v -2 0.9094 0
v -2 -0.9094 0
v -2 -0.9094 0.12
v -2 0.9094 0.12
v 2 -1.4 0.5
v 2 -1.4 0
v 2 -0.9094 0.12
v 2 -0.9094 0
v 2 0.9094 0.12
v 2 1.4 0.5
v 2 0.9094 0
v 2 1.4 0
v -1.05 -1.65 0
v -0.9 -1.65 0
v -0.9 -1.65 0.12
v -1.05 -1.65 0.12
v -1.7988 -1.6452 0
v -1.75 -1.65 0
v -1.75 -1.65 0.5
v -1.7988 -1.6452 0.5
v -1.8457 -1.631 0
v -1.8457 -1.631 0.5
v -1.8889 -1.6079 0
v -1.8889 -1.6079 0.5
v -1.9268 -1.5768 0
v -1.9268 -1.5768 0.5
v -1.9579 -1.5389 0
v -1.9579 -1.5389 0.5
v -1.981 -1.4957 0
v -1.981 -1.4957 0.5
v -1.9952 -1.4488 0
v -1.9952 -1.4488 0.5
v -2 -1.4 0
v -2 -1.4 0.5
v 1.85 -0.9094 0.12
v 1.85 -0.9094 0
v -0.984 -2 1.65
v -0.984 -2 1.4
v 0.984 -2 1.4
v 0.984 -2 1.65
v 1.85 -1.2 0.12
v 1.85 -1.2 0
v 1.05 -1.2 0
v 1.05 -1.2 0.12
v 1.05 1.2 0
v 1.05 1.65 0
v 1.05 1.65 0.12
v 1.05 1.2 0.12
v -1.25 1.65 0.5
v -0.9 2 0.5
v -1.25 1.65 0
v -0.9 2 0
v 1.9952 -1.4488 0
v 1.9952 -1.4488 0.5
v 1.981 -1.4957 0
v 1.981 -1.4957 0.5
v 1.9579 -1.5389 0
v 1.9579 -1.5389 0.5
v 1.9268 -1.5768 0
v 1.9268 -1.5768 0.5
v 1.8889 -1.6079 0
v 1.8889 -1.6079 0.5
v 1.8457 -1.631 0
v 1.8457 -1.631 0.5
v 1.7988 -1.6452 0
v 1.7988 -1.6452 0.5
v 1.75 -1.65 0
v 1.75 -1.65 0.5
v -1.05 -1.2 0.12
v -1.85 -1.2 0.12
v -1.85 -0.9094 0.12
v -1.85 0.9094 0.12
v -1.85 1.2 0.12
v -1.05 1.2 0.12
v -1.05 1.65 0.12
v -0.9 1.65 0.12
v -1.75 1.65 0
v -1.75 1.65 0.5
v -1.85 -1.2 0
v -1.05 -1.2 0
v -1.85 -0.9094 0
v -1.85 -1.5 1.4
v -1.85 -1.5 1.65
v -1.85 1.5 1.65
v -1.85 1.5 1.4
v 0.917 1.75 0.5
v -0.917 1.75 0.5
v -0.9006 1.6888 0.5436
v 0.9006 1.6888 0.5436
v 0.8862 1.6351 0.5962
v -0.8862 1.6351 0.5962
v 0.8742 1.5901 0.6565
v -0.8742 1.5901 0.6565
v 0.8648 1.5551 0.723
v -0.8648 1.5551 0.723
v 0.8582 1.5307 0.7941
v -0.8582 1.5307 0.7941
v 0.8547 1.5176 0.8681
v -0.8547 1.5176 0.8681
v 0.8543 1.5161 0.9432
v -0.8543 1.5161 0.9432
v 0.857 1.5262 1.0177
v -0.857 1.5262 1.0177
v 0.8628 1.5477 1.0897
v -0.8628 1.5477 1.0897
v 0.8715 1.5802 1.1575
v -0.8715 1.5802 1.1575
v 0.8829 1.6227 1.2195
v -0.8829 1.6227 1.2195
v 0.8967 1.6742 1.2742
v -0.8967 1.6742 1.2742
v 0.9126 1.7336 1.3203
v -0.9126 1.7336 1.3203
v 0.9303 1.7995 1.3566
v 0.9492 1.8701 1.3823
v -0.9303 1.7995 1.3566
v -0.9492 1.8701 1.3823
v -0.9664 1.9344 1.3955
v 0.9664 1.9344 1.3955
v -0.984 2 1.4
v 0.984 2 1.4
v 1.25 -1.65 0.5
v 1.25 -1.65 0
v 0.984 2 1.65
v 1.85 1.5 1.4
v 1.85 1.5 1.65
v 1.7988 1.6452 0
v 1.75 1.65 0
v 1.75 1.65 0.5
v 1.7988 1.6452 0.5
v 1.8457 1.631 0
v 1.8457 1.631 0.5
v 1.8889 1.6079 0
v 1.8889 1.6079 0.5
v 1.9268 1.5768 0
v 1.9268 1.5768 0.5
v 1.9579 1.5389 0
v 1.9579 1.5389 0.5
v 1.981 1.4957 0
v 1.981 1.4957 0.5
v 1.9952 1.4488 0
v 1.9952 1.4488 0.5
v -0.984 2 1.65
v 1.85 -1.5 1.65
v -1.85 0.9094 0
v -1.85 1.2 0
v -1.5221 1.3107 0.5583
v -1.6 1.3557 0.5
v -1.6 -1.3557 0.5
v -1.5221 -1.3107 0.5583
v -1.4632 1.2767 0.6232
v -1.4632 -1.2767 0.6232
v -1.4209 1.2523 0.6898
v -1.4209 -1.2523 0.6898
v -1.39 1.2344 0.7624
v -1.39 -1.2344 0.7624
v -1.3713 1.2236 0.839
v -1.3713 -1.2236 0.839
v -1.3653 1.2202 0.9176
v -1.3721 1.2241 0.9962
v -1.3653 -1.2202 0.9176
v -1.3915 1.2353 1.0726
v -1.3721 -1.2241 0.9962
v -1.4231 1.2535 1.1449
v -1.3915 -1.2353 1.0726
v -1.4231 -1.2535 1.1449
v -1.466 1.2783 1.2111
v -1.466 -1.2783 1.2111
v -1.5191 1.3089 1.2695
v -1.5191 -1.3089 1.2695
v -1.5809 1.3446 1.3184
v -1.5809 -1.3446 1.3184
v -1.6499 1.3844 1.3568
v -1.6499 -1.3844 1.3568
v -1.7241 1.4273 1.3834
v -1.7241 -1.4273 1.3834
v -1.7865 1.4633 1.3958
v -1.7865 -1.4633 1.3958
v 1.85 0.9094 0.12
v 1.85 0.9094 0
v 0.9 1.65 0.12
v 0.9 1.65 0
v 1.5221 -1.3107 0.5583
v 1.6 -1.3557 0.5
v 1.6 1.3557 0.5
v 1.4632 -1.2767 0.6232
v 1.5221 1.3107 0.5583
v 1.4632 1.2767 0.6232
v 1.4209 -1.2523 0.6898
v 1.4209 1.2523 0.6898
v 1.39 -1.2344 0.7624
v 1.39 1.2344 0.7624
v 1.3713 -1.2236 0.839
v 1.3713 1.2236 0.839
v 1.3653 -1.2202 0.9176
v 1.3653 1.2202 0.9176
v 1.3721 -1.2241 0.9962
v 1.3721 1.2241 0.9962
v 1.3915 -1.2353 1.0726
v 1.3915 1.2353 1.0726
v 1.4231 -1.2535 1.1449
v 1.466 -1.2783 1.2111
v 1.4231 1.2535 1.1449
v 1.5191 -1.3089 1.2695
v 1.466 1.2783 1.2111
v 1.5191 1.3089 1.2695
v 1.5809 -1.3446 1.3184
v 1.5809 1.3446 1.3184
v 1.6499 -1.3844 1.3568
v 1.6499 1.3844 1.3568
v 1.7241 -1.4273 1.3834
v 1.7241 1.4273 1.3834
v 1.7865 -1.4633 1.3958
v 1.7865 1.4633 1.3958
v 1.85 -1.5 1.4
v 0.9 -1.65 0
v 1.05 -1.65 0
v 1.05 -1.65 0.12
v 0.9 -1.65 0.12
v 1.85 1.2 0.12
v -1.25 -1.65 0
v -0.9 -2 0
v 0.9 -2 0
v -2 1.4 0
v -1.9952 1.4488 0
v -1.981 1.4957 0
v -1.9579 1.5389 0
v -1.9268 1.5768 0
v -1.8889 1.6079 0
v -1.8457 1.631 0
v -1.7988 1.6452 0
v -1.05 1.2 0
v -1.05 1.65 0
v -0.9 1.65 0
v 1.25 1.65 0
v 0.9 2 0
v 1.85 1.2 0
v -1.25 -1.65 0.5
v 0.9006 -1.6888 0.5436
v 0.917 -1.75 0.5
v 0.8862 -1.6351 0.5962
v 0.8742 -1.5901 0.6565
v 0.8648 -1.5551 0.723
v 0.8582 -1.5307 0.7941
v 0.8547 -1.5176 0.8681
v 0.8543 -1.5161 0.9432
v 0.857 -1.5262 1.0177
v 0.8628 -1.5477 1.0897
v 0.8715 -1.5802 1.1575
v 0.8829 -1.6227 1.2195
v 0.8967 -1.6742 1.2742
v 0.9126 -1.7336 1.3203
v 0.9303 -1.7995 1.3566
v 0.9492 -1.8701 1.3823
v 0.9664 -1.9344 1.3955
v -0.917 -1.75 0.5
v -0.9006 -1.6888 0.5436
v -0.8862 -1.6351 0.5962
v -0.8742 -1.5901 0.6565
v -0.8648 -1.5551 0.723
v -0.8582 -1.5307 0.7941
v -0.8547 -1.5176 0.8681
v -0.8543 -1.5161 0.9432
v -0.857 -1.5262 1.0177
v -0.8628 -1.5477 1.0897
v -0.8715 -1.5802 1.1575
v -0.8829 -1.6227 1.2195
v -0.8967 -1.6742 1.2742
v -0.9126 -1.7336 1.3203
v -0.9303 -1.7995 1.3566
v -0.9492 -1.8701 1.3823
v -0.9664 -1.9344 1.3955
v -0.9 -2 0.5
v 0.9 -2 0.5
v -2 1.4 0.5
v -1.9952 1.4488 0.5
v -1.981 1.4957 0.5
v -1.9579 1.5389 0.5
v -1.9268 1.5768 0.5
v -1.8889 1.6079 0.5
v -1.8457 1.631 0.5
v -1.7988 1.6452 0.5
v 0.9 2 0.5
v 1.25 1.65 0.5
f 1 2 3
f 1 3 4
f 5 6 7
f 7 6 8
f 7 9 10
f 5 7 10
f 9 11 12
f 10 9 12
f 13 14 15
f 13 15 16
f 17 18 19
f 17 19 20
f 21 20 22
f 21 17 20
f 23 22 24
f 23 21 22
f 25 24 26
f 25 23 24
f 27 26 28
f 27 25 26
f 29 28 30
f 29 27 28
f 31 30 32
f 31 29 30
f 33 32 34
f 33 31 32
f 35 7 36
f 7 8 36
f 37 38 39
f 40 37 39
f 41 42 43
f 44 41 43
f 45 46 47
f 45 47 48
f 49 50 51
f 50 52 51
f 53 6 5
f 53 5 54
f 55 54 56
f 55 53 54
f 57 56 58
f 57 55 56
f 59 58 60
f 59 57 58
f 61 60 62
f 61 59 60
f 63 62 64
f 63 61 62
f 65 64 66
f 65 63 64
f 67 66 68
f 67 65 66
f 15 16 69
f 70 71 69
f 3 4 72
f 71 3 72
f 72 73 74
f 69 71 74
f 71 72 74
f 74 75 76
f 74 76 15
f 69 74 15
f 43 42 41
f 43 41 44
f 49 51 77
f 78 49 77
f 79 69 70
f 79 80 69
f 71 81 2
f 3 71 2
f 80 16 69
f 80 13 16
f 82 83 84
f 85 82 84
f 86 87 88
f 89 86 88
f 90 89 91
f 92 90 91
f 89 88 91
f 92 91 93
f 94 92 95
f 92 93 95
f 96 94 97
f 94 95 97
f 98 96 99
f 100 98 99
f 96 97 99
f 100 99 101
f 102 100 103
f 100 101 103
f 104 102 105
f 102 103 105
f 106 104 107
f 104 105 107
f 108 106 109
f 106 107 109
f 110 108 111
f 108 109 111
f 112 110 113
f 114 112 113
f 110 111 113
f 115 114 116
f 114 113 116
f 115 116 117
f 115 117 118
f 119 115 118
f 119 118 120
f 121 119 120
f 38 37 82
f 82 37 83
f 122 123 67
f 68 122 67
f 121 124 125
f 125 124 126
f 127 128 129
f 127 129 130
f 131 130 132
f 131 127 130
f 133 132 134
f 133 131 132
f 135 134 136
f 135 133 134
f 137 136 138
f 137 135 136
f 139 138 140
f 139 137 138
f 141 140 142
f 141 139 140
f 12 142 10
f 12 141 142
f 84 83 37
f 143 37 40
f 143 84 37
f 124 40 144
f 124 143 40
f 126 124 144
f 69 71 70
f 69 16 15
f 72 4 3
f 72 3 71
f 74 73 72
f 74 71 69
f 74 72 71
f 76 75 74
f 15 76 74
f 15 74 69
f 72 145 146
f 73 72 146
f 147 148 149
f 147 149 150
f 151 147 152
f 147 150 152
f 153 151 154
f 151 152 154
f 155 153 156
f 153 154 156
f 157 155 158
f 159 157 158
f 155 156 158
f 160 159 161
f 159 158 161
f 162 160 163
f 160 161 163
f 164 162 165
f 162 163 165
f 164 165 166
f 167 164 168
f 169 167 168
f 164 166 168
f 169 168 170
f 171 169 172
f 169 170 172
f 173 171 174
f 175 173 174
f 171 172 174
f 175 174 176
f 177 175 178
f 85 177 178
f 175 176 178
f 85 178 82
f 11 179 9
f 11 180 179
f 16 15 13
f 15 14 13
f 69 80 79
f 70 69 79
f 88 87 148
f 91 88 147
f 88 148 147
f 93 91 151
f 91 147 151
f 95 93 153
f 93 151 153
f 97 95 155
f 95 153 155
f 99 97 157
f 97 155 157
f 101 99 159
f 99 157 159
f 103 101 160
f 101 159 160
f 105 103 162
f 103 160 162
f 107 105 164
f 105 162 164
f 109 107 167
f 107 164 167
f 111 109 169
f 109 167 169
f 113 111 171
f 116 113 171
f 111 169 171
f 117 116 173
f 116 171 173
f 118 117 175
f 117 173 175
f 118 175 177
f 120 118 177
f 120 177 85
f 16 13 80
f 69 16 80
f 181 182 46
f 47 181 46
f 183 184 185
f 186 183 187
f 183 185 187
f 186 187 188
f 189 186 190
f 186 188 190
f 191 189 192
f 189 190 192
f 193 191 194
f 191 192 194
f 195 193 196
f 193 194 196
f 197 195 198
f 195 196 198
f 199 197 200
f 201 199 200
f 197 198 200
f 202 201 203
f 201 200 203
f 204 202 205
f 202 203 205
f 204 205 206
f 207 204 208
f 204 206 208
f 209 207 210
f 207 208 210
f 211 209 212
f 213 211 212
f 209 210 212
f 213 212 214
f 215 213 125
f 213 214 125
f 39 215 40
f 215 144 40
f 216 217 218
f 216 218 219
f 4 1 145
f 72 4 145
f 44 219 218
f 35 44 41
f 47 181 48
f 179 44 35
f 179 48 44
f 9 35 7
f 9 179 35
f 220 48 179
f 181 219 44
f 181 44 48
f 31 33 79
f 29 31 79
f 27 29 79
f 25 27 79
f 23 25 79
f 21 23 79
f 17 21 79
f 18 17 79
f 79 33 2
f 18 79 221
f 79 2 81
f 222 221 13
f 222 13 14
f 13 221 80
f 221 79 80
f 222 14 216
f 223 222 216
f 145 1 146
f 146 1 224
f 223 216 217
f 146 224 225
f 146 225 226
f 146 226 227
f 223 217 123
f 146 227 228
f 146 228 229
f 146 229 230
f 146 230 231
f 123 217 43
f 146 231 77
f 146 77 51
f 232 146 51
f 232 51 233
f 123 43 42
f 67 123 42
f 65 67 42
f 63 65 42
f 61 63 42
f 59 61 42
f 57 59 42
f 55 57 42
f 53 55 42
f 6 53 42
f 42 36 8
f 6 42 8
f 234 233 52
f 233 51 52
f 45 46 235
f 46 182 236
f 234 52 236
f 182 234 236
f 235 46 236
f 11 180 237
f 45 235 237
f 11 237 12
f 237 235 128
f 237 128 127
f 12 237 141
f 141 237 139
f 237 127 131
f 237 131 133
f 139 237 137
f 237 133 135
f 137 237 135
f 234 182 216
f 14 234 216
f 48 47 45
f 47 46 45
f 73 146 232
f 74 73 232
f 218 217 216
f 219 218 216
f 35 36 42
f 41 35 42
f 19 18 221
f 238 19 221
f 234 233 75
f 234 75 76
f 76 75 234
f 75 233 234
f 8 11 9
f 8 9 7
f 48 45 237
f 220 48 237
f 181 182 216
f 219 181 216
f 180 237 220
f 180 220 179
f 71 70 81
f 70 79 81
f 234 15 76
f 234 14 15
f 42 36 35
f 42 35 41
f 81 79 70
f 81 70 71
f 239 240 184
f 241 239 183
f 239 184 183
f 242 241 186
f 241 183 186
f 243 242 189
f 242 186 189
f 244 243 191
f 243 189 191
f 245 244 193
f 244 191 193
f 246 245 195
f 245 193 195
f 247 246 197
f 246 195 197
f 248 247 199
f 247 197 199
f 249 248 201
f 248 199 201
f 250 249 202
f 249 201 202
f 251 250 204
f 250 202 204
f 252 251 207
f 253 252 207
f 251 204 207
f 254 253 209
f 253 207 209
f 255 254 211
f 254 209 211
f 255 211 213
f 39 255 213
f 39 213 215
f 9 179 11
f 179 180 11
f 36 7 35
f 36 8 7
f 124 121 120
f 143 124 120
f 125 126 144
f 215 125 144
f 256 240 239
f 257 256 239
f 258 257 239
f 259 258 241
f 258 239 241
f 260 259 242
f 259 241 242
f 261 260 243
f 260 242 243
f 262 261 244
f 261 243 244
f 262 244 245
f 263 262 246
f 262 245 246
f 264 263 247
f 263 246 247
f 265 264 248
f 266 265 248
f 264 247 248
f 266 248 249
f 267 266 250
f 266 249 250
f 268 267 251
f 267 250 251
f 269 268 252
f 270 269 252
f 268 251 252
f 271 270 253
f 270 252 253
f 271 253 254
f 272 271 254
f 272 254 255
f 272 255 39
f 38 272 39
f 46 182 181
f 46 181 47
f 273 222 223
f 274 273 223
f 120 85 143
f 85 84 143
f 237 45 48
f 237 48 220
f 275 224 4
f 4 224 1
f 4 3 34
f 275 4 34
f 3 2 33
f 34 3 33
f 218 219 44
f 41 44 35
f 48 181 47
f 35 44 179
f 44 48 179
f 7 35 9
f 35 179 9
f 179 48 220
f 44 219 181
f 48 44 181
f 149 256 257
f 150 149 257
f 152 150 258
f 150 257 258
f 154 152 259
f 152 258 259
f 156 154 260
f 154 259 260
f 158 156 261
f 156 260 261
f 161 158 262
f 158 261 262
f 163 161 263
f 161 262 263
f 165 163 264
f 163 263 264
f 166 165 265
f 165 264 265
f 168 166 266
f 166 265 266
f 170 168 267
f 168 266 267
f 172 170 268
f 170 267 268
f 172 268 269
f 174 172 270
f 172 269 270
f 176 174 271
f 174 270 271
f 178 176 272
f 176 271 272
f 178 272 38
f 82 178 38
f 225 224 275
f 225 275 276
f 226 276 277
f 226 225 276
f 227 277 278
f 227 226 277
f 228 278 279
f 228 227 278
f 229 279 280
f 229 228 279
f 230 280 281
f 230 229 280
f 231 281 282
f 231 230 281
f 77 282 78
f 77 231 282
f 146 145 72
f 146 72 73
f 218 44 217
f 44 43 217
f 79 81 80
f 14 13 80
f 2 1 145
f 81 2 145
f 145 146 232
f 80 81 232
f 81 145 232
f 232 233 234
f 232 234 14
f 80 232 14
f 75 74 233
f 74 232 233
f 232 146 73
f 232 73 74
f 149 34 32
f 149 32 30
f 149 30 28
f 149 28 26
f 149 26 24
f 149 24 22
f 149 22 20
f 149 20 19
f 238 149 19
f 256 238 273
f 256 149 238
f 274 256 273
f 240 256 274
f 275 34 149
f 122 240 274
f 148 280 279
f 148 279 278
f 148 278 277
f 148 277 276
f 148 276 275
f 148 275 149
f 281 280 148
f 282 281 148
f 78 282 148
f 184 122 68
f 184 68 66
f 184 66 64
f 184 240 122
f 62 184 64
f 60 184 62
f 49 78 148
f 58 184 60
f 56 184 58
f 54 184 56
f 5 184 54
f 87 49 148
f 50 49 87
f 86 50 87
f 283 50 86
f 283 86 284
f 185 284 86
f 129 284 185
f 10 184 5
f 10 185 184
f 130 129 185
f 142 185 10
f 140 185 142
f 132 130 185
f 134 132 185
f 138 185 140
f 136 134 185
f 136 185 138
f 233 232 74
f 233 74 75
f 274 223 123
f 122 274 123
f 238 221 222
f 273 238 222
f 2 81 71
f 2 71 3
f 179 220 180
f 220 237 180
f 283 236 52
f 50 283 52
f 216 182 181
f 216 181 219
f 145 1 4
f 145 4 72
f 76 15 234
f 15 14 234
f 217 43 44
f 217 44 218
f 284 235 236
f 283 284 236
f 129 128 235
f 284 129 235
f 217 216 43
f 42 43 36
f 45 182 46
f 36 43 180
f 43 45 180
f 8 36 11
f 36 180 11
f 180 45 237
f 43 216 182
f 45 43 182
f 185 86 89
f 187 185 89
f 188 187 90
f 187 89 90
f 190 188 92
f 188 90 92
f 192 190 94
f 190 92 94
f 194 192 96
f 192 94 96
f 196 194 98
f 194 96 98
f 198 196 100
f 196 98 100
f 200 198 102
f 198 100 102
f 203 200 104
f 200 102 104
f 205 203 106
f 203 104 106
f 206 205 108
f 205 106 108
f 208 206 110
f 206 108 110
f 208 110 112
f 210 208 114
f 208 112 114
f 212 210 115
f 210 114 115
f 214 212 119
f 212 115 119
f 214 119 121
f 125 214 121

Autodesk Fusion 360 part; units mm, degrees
sketch "Sketch1" plane through (0, 0, 0) normal (0, 0, 1) x (1, 0, 0)
  line L0 (-2, 1.4) -> (-2, -1.4)
  line L1 (-1.75, -1.65) -> (-1.25, -1.65)
  line L2 (-1.25, -1.65) -> (-0.9, -2)
  line L3 (-0.9, -2) -> (0.9, -2)
  line L4 (0.9, -2) -> (1.25, -1.65)
  line L5 (1.25, -1.65) -> (1.75, -1.65)
  line L6 (2, -1.4) -> (2, 1.4)
  line L7 (1.75, 1.65) -> (1.25, 1.65)
  line L8 (1.25, 1.65) -> (0.9, 2)
  line L9 (0.9, 2) -> (-0.9, 2)
  line L10 (-0.9, 2) -> (-1.25, 1.65)
  line L11 (-1.25, 1.65) -> (-1.75, 1.65)
  line L12 (-1.25, 1.65) -> (1.25, 1.65) construction
  line L13 (1.25, -1.65) -> (-1.25, -1.65) construction
  line L14 (-0.9, 2) -> (-0.9, -2) construction
  line L15 (0.9, 2) -> (0.9, -2) construction
  line L16 (-0.9, 1.65) -> (0.9, -1.65) construction
  arc A0 (-1.75, 1.65) -> (-2, 1.4) centre (-1.75, 1.4) ccw
  arc A1 (-2, -1.4) -> (-1.75, -1.65) centre (-1.75, -1.4) ccw
  arc A2 (1.75, -1.65) -> (2, -1.4) centre (1.75, -1.4) ccw
  arc A3 (2, 1.4) -> (1.75, 1.65) centre (1.75, 1.4) ccw
  point P0 (-2, 1.65)
  point P1 (-2, -1.65)
  dimension "d1" = 3.3
  dimension "d2" = 4
  dimension "d3" = 1.8
  dimension "d4" = 45
  dimension "d5" = 45
  dimension "d6" = 45
  dimension "d7" = 45
  dimension "d8" = 4
  dimension "d9" = 0.25
extrude "Extrude1" add sketch "Sketch1" along normal blind 0.5 makes body 1
ref_plane "WorkPlane1" through (0, 0, 1.65) normal (0, 0, 1) x (1, 0, 0)
sketch "Sketch2" plane through (0, 0, 1.65) normal (0, 0, 1) x (1, 0, 0)
  line L0 (1.85, -1.5) -> (-1.85, -1.5) construction
  line L1 (-1.85, -1.5) -> (-1.85, 1.5)
  line L2 (-1.85, 1.5) -> (1.85, 1.5) construction
  line L3 (1.85, 1.5) -> (1.85, -1.5)
  line L4 (-1.85, 1.5) -> (-0.984, 2)
  line L5 (-0.984, 2) -> (0.984, 2)
  line L6 (0.984, 2) -> (1.85, 1.5)
  line L7 (1.85, -1.5) -> (0.984, -2)
  line L8 (0.984, -2) -> (-0.984, -2)
  line L9 (-0.984, -2) -> (-1.85, -1.5)
  line L10 (-0.984, -2) -> (-0.984, 2) construction
  line L11 (0.984, 2) -> (0.984, -2) construction
  line L12 (-0.984, 1.5) -> (0.984, -1.5) construction
  dimension "d13" = 3.7
  dimension "d14" = 4
  dimension "d15" = 60
  dimension "d16" = 60
  dimension "d17" = 60
  dimension "d18" = 0.5
extrude "Extrude3" add sketch "Sketch2" against normal blind 1.15 bodies 1
ref_plane "WorkPlane4" through (0, 0, 0.825) normal (0, 0, 1) x (1, 0, 0)
sketch "Sketch6" plane through (0, 0, 0.825) normal (0, 0, 1) x (1, 0, 0)
  line L0 (-0.984, -2) -> (0.984, -2)
  line L1 (0.984, -2) -> (1.85, -1.5)
  line L2 (1.85, -1.5) -> (1.85, 1.5)
  line L3 (1.85, 1.5) -> (0.984, 2)
  line L4 (0.984, 2) -> (-0.984, 2)
  line L5 (-0.984, 2) -> (-1.85, 1.5)
  line L6 (-1.85, 1.5) -> (-1.85, -1.5)
  line L7 (-1.85, -1.5) -> (-0.984, -2)
ref_plane "WorkPlane5" through (0, 0, 1.075) normal (-1, 0, 0) x (0, 1, 0)
sketch "Sketch7" plane through (0, 0, 1.075) normal (-1, 0, 0) x (0, 1, 0)
  line L0 (2, -0.575) -> (1.5, -0.575)
  line L1 (2, -0.575) -> (2, 0.575)
  line L2 (2, -0.325) -> (1.5, -0.325) construction
  arc A0 (1.75, 0.575) -> (2, -0.325) centre (2, 0.1597) ccw
  line L3 (2, -0.325) -> (2, 0.575)
  line L4 (2, 0.575) -> (1.75, 0.575)
  dimension "d35" = 0.25
  dimension "d42" = 0.25
sweep "Sweep2" cut profiles "Sketch7" path "Sketch6" along L5 L6 L7 L0 L1 L2 L3 L4 section 1 bodies 1
sketch "Sketch8" plane through (0, 0, 0) normal (0, 0, 1) x (1, 0, 0)
  line L0 (-2, -1.65) -> (-0.9, -1.65) construction
  line L1 (-0.9, -1.65) -> (-0.9, 1.65)
  line L2 (-0.9, 1.65) -> (-2, 1.65) construction
  line L3 (-2, 1.65) -> (-2, -1.65) construction
  line L4 (-0.9, -1.65) -> (-1.05, -1.65)
  line L5 (-1.05, -1.2) -> (-1.85, -1.2)
  line L6 (-1.85, -1.2) -> (-1.85, -0.9094)
  line L7 (-1.85, -0.9094) -> (-2, -0.9094)
  line L8 (-2, 0.9094) -> (-1.85, 0.9094)
  line L9 (-1.85, 0.9094) -> (-1.85, 1.2)
  line L10 (-1.85, 1.2) -> (-1.05, 1.2)
  line L11 (-1.05, 1.2) -> (-1.05, 1.65)
  line L12 (-1.05, -1.65) -> (-1.05, -1.2)
  line L13 (-1.05, 1.65) -> (-0.9, 1.65)
  line L14 (-1.85, -0.9094) -> (-1.85, 0.9094) construction
  line L15 (-1.05, -1.2) -> (-1.05, 1.2) construction
  line L16 (-1.85, 0) -> (-0.9, 0) construction
  line L17 (-0.9, 0) -> (0, 0) construction
  line L18 (-2, -0.9094) -> (-2, 0.9094)
  line L19 (-2, 1.4) -> (-2, -1.4) construction
  dimension "d43" = 3.3
  dimension "d44" = 2.4
  dimension "d45" = 1.1
  dimension "d46" = 0.8
extrude "Extrude4" add sketch "Sketch8" along normal blind 0.12 separate body makes body 2
mirror "Mirror1" about plane through (0, 0, 0) normal (1, 0, 0) of bodies 2 makes body 3
combine "Combine1" operation cut target body 1 tool bodies 2 3 keep tools
